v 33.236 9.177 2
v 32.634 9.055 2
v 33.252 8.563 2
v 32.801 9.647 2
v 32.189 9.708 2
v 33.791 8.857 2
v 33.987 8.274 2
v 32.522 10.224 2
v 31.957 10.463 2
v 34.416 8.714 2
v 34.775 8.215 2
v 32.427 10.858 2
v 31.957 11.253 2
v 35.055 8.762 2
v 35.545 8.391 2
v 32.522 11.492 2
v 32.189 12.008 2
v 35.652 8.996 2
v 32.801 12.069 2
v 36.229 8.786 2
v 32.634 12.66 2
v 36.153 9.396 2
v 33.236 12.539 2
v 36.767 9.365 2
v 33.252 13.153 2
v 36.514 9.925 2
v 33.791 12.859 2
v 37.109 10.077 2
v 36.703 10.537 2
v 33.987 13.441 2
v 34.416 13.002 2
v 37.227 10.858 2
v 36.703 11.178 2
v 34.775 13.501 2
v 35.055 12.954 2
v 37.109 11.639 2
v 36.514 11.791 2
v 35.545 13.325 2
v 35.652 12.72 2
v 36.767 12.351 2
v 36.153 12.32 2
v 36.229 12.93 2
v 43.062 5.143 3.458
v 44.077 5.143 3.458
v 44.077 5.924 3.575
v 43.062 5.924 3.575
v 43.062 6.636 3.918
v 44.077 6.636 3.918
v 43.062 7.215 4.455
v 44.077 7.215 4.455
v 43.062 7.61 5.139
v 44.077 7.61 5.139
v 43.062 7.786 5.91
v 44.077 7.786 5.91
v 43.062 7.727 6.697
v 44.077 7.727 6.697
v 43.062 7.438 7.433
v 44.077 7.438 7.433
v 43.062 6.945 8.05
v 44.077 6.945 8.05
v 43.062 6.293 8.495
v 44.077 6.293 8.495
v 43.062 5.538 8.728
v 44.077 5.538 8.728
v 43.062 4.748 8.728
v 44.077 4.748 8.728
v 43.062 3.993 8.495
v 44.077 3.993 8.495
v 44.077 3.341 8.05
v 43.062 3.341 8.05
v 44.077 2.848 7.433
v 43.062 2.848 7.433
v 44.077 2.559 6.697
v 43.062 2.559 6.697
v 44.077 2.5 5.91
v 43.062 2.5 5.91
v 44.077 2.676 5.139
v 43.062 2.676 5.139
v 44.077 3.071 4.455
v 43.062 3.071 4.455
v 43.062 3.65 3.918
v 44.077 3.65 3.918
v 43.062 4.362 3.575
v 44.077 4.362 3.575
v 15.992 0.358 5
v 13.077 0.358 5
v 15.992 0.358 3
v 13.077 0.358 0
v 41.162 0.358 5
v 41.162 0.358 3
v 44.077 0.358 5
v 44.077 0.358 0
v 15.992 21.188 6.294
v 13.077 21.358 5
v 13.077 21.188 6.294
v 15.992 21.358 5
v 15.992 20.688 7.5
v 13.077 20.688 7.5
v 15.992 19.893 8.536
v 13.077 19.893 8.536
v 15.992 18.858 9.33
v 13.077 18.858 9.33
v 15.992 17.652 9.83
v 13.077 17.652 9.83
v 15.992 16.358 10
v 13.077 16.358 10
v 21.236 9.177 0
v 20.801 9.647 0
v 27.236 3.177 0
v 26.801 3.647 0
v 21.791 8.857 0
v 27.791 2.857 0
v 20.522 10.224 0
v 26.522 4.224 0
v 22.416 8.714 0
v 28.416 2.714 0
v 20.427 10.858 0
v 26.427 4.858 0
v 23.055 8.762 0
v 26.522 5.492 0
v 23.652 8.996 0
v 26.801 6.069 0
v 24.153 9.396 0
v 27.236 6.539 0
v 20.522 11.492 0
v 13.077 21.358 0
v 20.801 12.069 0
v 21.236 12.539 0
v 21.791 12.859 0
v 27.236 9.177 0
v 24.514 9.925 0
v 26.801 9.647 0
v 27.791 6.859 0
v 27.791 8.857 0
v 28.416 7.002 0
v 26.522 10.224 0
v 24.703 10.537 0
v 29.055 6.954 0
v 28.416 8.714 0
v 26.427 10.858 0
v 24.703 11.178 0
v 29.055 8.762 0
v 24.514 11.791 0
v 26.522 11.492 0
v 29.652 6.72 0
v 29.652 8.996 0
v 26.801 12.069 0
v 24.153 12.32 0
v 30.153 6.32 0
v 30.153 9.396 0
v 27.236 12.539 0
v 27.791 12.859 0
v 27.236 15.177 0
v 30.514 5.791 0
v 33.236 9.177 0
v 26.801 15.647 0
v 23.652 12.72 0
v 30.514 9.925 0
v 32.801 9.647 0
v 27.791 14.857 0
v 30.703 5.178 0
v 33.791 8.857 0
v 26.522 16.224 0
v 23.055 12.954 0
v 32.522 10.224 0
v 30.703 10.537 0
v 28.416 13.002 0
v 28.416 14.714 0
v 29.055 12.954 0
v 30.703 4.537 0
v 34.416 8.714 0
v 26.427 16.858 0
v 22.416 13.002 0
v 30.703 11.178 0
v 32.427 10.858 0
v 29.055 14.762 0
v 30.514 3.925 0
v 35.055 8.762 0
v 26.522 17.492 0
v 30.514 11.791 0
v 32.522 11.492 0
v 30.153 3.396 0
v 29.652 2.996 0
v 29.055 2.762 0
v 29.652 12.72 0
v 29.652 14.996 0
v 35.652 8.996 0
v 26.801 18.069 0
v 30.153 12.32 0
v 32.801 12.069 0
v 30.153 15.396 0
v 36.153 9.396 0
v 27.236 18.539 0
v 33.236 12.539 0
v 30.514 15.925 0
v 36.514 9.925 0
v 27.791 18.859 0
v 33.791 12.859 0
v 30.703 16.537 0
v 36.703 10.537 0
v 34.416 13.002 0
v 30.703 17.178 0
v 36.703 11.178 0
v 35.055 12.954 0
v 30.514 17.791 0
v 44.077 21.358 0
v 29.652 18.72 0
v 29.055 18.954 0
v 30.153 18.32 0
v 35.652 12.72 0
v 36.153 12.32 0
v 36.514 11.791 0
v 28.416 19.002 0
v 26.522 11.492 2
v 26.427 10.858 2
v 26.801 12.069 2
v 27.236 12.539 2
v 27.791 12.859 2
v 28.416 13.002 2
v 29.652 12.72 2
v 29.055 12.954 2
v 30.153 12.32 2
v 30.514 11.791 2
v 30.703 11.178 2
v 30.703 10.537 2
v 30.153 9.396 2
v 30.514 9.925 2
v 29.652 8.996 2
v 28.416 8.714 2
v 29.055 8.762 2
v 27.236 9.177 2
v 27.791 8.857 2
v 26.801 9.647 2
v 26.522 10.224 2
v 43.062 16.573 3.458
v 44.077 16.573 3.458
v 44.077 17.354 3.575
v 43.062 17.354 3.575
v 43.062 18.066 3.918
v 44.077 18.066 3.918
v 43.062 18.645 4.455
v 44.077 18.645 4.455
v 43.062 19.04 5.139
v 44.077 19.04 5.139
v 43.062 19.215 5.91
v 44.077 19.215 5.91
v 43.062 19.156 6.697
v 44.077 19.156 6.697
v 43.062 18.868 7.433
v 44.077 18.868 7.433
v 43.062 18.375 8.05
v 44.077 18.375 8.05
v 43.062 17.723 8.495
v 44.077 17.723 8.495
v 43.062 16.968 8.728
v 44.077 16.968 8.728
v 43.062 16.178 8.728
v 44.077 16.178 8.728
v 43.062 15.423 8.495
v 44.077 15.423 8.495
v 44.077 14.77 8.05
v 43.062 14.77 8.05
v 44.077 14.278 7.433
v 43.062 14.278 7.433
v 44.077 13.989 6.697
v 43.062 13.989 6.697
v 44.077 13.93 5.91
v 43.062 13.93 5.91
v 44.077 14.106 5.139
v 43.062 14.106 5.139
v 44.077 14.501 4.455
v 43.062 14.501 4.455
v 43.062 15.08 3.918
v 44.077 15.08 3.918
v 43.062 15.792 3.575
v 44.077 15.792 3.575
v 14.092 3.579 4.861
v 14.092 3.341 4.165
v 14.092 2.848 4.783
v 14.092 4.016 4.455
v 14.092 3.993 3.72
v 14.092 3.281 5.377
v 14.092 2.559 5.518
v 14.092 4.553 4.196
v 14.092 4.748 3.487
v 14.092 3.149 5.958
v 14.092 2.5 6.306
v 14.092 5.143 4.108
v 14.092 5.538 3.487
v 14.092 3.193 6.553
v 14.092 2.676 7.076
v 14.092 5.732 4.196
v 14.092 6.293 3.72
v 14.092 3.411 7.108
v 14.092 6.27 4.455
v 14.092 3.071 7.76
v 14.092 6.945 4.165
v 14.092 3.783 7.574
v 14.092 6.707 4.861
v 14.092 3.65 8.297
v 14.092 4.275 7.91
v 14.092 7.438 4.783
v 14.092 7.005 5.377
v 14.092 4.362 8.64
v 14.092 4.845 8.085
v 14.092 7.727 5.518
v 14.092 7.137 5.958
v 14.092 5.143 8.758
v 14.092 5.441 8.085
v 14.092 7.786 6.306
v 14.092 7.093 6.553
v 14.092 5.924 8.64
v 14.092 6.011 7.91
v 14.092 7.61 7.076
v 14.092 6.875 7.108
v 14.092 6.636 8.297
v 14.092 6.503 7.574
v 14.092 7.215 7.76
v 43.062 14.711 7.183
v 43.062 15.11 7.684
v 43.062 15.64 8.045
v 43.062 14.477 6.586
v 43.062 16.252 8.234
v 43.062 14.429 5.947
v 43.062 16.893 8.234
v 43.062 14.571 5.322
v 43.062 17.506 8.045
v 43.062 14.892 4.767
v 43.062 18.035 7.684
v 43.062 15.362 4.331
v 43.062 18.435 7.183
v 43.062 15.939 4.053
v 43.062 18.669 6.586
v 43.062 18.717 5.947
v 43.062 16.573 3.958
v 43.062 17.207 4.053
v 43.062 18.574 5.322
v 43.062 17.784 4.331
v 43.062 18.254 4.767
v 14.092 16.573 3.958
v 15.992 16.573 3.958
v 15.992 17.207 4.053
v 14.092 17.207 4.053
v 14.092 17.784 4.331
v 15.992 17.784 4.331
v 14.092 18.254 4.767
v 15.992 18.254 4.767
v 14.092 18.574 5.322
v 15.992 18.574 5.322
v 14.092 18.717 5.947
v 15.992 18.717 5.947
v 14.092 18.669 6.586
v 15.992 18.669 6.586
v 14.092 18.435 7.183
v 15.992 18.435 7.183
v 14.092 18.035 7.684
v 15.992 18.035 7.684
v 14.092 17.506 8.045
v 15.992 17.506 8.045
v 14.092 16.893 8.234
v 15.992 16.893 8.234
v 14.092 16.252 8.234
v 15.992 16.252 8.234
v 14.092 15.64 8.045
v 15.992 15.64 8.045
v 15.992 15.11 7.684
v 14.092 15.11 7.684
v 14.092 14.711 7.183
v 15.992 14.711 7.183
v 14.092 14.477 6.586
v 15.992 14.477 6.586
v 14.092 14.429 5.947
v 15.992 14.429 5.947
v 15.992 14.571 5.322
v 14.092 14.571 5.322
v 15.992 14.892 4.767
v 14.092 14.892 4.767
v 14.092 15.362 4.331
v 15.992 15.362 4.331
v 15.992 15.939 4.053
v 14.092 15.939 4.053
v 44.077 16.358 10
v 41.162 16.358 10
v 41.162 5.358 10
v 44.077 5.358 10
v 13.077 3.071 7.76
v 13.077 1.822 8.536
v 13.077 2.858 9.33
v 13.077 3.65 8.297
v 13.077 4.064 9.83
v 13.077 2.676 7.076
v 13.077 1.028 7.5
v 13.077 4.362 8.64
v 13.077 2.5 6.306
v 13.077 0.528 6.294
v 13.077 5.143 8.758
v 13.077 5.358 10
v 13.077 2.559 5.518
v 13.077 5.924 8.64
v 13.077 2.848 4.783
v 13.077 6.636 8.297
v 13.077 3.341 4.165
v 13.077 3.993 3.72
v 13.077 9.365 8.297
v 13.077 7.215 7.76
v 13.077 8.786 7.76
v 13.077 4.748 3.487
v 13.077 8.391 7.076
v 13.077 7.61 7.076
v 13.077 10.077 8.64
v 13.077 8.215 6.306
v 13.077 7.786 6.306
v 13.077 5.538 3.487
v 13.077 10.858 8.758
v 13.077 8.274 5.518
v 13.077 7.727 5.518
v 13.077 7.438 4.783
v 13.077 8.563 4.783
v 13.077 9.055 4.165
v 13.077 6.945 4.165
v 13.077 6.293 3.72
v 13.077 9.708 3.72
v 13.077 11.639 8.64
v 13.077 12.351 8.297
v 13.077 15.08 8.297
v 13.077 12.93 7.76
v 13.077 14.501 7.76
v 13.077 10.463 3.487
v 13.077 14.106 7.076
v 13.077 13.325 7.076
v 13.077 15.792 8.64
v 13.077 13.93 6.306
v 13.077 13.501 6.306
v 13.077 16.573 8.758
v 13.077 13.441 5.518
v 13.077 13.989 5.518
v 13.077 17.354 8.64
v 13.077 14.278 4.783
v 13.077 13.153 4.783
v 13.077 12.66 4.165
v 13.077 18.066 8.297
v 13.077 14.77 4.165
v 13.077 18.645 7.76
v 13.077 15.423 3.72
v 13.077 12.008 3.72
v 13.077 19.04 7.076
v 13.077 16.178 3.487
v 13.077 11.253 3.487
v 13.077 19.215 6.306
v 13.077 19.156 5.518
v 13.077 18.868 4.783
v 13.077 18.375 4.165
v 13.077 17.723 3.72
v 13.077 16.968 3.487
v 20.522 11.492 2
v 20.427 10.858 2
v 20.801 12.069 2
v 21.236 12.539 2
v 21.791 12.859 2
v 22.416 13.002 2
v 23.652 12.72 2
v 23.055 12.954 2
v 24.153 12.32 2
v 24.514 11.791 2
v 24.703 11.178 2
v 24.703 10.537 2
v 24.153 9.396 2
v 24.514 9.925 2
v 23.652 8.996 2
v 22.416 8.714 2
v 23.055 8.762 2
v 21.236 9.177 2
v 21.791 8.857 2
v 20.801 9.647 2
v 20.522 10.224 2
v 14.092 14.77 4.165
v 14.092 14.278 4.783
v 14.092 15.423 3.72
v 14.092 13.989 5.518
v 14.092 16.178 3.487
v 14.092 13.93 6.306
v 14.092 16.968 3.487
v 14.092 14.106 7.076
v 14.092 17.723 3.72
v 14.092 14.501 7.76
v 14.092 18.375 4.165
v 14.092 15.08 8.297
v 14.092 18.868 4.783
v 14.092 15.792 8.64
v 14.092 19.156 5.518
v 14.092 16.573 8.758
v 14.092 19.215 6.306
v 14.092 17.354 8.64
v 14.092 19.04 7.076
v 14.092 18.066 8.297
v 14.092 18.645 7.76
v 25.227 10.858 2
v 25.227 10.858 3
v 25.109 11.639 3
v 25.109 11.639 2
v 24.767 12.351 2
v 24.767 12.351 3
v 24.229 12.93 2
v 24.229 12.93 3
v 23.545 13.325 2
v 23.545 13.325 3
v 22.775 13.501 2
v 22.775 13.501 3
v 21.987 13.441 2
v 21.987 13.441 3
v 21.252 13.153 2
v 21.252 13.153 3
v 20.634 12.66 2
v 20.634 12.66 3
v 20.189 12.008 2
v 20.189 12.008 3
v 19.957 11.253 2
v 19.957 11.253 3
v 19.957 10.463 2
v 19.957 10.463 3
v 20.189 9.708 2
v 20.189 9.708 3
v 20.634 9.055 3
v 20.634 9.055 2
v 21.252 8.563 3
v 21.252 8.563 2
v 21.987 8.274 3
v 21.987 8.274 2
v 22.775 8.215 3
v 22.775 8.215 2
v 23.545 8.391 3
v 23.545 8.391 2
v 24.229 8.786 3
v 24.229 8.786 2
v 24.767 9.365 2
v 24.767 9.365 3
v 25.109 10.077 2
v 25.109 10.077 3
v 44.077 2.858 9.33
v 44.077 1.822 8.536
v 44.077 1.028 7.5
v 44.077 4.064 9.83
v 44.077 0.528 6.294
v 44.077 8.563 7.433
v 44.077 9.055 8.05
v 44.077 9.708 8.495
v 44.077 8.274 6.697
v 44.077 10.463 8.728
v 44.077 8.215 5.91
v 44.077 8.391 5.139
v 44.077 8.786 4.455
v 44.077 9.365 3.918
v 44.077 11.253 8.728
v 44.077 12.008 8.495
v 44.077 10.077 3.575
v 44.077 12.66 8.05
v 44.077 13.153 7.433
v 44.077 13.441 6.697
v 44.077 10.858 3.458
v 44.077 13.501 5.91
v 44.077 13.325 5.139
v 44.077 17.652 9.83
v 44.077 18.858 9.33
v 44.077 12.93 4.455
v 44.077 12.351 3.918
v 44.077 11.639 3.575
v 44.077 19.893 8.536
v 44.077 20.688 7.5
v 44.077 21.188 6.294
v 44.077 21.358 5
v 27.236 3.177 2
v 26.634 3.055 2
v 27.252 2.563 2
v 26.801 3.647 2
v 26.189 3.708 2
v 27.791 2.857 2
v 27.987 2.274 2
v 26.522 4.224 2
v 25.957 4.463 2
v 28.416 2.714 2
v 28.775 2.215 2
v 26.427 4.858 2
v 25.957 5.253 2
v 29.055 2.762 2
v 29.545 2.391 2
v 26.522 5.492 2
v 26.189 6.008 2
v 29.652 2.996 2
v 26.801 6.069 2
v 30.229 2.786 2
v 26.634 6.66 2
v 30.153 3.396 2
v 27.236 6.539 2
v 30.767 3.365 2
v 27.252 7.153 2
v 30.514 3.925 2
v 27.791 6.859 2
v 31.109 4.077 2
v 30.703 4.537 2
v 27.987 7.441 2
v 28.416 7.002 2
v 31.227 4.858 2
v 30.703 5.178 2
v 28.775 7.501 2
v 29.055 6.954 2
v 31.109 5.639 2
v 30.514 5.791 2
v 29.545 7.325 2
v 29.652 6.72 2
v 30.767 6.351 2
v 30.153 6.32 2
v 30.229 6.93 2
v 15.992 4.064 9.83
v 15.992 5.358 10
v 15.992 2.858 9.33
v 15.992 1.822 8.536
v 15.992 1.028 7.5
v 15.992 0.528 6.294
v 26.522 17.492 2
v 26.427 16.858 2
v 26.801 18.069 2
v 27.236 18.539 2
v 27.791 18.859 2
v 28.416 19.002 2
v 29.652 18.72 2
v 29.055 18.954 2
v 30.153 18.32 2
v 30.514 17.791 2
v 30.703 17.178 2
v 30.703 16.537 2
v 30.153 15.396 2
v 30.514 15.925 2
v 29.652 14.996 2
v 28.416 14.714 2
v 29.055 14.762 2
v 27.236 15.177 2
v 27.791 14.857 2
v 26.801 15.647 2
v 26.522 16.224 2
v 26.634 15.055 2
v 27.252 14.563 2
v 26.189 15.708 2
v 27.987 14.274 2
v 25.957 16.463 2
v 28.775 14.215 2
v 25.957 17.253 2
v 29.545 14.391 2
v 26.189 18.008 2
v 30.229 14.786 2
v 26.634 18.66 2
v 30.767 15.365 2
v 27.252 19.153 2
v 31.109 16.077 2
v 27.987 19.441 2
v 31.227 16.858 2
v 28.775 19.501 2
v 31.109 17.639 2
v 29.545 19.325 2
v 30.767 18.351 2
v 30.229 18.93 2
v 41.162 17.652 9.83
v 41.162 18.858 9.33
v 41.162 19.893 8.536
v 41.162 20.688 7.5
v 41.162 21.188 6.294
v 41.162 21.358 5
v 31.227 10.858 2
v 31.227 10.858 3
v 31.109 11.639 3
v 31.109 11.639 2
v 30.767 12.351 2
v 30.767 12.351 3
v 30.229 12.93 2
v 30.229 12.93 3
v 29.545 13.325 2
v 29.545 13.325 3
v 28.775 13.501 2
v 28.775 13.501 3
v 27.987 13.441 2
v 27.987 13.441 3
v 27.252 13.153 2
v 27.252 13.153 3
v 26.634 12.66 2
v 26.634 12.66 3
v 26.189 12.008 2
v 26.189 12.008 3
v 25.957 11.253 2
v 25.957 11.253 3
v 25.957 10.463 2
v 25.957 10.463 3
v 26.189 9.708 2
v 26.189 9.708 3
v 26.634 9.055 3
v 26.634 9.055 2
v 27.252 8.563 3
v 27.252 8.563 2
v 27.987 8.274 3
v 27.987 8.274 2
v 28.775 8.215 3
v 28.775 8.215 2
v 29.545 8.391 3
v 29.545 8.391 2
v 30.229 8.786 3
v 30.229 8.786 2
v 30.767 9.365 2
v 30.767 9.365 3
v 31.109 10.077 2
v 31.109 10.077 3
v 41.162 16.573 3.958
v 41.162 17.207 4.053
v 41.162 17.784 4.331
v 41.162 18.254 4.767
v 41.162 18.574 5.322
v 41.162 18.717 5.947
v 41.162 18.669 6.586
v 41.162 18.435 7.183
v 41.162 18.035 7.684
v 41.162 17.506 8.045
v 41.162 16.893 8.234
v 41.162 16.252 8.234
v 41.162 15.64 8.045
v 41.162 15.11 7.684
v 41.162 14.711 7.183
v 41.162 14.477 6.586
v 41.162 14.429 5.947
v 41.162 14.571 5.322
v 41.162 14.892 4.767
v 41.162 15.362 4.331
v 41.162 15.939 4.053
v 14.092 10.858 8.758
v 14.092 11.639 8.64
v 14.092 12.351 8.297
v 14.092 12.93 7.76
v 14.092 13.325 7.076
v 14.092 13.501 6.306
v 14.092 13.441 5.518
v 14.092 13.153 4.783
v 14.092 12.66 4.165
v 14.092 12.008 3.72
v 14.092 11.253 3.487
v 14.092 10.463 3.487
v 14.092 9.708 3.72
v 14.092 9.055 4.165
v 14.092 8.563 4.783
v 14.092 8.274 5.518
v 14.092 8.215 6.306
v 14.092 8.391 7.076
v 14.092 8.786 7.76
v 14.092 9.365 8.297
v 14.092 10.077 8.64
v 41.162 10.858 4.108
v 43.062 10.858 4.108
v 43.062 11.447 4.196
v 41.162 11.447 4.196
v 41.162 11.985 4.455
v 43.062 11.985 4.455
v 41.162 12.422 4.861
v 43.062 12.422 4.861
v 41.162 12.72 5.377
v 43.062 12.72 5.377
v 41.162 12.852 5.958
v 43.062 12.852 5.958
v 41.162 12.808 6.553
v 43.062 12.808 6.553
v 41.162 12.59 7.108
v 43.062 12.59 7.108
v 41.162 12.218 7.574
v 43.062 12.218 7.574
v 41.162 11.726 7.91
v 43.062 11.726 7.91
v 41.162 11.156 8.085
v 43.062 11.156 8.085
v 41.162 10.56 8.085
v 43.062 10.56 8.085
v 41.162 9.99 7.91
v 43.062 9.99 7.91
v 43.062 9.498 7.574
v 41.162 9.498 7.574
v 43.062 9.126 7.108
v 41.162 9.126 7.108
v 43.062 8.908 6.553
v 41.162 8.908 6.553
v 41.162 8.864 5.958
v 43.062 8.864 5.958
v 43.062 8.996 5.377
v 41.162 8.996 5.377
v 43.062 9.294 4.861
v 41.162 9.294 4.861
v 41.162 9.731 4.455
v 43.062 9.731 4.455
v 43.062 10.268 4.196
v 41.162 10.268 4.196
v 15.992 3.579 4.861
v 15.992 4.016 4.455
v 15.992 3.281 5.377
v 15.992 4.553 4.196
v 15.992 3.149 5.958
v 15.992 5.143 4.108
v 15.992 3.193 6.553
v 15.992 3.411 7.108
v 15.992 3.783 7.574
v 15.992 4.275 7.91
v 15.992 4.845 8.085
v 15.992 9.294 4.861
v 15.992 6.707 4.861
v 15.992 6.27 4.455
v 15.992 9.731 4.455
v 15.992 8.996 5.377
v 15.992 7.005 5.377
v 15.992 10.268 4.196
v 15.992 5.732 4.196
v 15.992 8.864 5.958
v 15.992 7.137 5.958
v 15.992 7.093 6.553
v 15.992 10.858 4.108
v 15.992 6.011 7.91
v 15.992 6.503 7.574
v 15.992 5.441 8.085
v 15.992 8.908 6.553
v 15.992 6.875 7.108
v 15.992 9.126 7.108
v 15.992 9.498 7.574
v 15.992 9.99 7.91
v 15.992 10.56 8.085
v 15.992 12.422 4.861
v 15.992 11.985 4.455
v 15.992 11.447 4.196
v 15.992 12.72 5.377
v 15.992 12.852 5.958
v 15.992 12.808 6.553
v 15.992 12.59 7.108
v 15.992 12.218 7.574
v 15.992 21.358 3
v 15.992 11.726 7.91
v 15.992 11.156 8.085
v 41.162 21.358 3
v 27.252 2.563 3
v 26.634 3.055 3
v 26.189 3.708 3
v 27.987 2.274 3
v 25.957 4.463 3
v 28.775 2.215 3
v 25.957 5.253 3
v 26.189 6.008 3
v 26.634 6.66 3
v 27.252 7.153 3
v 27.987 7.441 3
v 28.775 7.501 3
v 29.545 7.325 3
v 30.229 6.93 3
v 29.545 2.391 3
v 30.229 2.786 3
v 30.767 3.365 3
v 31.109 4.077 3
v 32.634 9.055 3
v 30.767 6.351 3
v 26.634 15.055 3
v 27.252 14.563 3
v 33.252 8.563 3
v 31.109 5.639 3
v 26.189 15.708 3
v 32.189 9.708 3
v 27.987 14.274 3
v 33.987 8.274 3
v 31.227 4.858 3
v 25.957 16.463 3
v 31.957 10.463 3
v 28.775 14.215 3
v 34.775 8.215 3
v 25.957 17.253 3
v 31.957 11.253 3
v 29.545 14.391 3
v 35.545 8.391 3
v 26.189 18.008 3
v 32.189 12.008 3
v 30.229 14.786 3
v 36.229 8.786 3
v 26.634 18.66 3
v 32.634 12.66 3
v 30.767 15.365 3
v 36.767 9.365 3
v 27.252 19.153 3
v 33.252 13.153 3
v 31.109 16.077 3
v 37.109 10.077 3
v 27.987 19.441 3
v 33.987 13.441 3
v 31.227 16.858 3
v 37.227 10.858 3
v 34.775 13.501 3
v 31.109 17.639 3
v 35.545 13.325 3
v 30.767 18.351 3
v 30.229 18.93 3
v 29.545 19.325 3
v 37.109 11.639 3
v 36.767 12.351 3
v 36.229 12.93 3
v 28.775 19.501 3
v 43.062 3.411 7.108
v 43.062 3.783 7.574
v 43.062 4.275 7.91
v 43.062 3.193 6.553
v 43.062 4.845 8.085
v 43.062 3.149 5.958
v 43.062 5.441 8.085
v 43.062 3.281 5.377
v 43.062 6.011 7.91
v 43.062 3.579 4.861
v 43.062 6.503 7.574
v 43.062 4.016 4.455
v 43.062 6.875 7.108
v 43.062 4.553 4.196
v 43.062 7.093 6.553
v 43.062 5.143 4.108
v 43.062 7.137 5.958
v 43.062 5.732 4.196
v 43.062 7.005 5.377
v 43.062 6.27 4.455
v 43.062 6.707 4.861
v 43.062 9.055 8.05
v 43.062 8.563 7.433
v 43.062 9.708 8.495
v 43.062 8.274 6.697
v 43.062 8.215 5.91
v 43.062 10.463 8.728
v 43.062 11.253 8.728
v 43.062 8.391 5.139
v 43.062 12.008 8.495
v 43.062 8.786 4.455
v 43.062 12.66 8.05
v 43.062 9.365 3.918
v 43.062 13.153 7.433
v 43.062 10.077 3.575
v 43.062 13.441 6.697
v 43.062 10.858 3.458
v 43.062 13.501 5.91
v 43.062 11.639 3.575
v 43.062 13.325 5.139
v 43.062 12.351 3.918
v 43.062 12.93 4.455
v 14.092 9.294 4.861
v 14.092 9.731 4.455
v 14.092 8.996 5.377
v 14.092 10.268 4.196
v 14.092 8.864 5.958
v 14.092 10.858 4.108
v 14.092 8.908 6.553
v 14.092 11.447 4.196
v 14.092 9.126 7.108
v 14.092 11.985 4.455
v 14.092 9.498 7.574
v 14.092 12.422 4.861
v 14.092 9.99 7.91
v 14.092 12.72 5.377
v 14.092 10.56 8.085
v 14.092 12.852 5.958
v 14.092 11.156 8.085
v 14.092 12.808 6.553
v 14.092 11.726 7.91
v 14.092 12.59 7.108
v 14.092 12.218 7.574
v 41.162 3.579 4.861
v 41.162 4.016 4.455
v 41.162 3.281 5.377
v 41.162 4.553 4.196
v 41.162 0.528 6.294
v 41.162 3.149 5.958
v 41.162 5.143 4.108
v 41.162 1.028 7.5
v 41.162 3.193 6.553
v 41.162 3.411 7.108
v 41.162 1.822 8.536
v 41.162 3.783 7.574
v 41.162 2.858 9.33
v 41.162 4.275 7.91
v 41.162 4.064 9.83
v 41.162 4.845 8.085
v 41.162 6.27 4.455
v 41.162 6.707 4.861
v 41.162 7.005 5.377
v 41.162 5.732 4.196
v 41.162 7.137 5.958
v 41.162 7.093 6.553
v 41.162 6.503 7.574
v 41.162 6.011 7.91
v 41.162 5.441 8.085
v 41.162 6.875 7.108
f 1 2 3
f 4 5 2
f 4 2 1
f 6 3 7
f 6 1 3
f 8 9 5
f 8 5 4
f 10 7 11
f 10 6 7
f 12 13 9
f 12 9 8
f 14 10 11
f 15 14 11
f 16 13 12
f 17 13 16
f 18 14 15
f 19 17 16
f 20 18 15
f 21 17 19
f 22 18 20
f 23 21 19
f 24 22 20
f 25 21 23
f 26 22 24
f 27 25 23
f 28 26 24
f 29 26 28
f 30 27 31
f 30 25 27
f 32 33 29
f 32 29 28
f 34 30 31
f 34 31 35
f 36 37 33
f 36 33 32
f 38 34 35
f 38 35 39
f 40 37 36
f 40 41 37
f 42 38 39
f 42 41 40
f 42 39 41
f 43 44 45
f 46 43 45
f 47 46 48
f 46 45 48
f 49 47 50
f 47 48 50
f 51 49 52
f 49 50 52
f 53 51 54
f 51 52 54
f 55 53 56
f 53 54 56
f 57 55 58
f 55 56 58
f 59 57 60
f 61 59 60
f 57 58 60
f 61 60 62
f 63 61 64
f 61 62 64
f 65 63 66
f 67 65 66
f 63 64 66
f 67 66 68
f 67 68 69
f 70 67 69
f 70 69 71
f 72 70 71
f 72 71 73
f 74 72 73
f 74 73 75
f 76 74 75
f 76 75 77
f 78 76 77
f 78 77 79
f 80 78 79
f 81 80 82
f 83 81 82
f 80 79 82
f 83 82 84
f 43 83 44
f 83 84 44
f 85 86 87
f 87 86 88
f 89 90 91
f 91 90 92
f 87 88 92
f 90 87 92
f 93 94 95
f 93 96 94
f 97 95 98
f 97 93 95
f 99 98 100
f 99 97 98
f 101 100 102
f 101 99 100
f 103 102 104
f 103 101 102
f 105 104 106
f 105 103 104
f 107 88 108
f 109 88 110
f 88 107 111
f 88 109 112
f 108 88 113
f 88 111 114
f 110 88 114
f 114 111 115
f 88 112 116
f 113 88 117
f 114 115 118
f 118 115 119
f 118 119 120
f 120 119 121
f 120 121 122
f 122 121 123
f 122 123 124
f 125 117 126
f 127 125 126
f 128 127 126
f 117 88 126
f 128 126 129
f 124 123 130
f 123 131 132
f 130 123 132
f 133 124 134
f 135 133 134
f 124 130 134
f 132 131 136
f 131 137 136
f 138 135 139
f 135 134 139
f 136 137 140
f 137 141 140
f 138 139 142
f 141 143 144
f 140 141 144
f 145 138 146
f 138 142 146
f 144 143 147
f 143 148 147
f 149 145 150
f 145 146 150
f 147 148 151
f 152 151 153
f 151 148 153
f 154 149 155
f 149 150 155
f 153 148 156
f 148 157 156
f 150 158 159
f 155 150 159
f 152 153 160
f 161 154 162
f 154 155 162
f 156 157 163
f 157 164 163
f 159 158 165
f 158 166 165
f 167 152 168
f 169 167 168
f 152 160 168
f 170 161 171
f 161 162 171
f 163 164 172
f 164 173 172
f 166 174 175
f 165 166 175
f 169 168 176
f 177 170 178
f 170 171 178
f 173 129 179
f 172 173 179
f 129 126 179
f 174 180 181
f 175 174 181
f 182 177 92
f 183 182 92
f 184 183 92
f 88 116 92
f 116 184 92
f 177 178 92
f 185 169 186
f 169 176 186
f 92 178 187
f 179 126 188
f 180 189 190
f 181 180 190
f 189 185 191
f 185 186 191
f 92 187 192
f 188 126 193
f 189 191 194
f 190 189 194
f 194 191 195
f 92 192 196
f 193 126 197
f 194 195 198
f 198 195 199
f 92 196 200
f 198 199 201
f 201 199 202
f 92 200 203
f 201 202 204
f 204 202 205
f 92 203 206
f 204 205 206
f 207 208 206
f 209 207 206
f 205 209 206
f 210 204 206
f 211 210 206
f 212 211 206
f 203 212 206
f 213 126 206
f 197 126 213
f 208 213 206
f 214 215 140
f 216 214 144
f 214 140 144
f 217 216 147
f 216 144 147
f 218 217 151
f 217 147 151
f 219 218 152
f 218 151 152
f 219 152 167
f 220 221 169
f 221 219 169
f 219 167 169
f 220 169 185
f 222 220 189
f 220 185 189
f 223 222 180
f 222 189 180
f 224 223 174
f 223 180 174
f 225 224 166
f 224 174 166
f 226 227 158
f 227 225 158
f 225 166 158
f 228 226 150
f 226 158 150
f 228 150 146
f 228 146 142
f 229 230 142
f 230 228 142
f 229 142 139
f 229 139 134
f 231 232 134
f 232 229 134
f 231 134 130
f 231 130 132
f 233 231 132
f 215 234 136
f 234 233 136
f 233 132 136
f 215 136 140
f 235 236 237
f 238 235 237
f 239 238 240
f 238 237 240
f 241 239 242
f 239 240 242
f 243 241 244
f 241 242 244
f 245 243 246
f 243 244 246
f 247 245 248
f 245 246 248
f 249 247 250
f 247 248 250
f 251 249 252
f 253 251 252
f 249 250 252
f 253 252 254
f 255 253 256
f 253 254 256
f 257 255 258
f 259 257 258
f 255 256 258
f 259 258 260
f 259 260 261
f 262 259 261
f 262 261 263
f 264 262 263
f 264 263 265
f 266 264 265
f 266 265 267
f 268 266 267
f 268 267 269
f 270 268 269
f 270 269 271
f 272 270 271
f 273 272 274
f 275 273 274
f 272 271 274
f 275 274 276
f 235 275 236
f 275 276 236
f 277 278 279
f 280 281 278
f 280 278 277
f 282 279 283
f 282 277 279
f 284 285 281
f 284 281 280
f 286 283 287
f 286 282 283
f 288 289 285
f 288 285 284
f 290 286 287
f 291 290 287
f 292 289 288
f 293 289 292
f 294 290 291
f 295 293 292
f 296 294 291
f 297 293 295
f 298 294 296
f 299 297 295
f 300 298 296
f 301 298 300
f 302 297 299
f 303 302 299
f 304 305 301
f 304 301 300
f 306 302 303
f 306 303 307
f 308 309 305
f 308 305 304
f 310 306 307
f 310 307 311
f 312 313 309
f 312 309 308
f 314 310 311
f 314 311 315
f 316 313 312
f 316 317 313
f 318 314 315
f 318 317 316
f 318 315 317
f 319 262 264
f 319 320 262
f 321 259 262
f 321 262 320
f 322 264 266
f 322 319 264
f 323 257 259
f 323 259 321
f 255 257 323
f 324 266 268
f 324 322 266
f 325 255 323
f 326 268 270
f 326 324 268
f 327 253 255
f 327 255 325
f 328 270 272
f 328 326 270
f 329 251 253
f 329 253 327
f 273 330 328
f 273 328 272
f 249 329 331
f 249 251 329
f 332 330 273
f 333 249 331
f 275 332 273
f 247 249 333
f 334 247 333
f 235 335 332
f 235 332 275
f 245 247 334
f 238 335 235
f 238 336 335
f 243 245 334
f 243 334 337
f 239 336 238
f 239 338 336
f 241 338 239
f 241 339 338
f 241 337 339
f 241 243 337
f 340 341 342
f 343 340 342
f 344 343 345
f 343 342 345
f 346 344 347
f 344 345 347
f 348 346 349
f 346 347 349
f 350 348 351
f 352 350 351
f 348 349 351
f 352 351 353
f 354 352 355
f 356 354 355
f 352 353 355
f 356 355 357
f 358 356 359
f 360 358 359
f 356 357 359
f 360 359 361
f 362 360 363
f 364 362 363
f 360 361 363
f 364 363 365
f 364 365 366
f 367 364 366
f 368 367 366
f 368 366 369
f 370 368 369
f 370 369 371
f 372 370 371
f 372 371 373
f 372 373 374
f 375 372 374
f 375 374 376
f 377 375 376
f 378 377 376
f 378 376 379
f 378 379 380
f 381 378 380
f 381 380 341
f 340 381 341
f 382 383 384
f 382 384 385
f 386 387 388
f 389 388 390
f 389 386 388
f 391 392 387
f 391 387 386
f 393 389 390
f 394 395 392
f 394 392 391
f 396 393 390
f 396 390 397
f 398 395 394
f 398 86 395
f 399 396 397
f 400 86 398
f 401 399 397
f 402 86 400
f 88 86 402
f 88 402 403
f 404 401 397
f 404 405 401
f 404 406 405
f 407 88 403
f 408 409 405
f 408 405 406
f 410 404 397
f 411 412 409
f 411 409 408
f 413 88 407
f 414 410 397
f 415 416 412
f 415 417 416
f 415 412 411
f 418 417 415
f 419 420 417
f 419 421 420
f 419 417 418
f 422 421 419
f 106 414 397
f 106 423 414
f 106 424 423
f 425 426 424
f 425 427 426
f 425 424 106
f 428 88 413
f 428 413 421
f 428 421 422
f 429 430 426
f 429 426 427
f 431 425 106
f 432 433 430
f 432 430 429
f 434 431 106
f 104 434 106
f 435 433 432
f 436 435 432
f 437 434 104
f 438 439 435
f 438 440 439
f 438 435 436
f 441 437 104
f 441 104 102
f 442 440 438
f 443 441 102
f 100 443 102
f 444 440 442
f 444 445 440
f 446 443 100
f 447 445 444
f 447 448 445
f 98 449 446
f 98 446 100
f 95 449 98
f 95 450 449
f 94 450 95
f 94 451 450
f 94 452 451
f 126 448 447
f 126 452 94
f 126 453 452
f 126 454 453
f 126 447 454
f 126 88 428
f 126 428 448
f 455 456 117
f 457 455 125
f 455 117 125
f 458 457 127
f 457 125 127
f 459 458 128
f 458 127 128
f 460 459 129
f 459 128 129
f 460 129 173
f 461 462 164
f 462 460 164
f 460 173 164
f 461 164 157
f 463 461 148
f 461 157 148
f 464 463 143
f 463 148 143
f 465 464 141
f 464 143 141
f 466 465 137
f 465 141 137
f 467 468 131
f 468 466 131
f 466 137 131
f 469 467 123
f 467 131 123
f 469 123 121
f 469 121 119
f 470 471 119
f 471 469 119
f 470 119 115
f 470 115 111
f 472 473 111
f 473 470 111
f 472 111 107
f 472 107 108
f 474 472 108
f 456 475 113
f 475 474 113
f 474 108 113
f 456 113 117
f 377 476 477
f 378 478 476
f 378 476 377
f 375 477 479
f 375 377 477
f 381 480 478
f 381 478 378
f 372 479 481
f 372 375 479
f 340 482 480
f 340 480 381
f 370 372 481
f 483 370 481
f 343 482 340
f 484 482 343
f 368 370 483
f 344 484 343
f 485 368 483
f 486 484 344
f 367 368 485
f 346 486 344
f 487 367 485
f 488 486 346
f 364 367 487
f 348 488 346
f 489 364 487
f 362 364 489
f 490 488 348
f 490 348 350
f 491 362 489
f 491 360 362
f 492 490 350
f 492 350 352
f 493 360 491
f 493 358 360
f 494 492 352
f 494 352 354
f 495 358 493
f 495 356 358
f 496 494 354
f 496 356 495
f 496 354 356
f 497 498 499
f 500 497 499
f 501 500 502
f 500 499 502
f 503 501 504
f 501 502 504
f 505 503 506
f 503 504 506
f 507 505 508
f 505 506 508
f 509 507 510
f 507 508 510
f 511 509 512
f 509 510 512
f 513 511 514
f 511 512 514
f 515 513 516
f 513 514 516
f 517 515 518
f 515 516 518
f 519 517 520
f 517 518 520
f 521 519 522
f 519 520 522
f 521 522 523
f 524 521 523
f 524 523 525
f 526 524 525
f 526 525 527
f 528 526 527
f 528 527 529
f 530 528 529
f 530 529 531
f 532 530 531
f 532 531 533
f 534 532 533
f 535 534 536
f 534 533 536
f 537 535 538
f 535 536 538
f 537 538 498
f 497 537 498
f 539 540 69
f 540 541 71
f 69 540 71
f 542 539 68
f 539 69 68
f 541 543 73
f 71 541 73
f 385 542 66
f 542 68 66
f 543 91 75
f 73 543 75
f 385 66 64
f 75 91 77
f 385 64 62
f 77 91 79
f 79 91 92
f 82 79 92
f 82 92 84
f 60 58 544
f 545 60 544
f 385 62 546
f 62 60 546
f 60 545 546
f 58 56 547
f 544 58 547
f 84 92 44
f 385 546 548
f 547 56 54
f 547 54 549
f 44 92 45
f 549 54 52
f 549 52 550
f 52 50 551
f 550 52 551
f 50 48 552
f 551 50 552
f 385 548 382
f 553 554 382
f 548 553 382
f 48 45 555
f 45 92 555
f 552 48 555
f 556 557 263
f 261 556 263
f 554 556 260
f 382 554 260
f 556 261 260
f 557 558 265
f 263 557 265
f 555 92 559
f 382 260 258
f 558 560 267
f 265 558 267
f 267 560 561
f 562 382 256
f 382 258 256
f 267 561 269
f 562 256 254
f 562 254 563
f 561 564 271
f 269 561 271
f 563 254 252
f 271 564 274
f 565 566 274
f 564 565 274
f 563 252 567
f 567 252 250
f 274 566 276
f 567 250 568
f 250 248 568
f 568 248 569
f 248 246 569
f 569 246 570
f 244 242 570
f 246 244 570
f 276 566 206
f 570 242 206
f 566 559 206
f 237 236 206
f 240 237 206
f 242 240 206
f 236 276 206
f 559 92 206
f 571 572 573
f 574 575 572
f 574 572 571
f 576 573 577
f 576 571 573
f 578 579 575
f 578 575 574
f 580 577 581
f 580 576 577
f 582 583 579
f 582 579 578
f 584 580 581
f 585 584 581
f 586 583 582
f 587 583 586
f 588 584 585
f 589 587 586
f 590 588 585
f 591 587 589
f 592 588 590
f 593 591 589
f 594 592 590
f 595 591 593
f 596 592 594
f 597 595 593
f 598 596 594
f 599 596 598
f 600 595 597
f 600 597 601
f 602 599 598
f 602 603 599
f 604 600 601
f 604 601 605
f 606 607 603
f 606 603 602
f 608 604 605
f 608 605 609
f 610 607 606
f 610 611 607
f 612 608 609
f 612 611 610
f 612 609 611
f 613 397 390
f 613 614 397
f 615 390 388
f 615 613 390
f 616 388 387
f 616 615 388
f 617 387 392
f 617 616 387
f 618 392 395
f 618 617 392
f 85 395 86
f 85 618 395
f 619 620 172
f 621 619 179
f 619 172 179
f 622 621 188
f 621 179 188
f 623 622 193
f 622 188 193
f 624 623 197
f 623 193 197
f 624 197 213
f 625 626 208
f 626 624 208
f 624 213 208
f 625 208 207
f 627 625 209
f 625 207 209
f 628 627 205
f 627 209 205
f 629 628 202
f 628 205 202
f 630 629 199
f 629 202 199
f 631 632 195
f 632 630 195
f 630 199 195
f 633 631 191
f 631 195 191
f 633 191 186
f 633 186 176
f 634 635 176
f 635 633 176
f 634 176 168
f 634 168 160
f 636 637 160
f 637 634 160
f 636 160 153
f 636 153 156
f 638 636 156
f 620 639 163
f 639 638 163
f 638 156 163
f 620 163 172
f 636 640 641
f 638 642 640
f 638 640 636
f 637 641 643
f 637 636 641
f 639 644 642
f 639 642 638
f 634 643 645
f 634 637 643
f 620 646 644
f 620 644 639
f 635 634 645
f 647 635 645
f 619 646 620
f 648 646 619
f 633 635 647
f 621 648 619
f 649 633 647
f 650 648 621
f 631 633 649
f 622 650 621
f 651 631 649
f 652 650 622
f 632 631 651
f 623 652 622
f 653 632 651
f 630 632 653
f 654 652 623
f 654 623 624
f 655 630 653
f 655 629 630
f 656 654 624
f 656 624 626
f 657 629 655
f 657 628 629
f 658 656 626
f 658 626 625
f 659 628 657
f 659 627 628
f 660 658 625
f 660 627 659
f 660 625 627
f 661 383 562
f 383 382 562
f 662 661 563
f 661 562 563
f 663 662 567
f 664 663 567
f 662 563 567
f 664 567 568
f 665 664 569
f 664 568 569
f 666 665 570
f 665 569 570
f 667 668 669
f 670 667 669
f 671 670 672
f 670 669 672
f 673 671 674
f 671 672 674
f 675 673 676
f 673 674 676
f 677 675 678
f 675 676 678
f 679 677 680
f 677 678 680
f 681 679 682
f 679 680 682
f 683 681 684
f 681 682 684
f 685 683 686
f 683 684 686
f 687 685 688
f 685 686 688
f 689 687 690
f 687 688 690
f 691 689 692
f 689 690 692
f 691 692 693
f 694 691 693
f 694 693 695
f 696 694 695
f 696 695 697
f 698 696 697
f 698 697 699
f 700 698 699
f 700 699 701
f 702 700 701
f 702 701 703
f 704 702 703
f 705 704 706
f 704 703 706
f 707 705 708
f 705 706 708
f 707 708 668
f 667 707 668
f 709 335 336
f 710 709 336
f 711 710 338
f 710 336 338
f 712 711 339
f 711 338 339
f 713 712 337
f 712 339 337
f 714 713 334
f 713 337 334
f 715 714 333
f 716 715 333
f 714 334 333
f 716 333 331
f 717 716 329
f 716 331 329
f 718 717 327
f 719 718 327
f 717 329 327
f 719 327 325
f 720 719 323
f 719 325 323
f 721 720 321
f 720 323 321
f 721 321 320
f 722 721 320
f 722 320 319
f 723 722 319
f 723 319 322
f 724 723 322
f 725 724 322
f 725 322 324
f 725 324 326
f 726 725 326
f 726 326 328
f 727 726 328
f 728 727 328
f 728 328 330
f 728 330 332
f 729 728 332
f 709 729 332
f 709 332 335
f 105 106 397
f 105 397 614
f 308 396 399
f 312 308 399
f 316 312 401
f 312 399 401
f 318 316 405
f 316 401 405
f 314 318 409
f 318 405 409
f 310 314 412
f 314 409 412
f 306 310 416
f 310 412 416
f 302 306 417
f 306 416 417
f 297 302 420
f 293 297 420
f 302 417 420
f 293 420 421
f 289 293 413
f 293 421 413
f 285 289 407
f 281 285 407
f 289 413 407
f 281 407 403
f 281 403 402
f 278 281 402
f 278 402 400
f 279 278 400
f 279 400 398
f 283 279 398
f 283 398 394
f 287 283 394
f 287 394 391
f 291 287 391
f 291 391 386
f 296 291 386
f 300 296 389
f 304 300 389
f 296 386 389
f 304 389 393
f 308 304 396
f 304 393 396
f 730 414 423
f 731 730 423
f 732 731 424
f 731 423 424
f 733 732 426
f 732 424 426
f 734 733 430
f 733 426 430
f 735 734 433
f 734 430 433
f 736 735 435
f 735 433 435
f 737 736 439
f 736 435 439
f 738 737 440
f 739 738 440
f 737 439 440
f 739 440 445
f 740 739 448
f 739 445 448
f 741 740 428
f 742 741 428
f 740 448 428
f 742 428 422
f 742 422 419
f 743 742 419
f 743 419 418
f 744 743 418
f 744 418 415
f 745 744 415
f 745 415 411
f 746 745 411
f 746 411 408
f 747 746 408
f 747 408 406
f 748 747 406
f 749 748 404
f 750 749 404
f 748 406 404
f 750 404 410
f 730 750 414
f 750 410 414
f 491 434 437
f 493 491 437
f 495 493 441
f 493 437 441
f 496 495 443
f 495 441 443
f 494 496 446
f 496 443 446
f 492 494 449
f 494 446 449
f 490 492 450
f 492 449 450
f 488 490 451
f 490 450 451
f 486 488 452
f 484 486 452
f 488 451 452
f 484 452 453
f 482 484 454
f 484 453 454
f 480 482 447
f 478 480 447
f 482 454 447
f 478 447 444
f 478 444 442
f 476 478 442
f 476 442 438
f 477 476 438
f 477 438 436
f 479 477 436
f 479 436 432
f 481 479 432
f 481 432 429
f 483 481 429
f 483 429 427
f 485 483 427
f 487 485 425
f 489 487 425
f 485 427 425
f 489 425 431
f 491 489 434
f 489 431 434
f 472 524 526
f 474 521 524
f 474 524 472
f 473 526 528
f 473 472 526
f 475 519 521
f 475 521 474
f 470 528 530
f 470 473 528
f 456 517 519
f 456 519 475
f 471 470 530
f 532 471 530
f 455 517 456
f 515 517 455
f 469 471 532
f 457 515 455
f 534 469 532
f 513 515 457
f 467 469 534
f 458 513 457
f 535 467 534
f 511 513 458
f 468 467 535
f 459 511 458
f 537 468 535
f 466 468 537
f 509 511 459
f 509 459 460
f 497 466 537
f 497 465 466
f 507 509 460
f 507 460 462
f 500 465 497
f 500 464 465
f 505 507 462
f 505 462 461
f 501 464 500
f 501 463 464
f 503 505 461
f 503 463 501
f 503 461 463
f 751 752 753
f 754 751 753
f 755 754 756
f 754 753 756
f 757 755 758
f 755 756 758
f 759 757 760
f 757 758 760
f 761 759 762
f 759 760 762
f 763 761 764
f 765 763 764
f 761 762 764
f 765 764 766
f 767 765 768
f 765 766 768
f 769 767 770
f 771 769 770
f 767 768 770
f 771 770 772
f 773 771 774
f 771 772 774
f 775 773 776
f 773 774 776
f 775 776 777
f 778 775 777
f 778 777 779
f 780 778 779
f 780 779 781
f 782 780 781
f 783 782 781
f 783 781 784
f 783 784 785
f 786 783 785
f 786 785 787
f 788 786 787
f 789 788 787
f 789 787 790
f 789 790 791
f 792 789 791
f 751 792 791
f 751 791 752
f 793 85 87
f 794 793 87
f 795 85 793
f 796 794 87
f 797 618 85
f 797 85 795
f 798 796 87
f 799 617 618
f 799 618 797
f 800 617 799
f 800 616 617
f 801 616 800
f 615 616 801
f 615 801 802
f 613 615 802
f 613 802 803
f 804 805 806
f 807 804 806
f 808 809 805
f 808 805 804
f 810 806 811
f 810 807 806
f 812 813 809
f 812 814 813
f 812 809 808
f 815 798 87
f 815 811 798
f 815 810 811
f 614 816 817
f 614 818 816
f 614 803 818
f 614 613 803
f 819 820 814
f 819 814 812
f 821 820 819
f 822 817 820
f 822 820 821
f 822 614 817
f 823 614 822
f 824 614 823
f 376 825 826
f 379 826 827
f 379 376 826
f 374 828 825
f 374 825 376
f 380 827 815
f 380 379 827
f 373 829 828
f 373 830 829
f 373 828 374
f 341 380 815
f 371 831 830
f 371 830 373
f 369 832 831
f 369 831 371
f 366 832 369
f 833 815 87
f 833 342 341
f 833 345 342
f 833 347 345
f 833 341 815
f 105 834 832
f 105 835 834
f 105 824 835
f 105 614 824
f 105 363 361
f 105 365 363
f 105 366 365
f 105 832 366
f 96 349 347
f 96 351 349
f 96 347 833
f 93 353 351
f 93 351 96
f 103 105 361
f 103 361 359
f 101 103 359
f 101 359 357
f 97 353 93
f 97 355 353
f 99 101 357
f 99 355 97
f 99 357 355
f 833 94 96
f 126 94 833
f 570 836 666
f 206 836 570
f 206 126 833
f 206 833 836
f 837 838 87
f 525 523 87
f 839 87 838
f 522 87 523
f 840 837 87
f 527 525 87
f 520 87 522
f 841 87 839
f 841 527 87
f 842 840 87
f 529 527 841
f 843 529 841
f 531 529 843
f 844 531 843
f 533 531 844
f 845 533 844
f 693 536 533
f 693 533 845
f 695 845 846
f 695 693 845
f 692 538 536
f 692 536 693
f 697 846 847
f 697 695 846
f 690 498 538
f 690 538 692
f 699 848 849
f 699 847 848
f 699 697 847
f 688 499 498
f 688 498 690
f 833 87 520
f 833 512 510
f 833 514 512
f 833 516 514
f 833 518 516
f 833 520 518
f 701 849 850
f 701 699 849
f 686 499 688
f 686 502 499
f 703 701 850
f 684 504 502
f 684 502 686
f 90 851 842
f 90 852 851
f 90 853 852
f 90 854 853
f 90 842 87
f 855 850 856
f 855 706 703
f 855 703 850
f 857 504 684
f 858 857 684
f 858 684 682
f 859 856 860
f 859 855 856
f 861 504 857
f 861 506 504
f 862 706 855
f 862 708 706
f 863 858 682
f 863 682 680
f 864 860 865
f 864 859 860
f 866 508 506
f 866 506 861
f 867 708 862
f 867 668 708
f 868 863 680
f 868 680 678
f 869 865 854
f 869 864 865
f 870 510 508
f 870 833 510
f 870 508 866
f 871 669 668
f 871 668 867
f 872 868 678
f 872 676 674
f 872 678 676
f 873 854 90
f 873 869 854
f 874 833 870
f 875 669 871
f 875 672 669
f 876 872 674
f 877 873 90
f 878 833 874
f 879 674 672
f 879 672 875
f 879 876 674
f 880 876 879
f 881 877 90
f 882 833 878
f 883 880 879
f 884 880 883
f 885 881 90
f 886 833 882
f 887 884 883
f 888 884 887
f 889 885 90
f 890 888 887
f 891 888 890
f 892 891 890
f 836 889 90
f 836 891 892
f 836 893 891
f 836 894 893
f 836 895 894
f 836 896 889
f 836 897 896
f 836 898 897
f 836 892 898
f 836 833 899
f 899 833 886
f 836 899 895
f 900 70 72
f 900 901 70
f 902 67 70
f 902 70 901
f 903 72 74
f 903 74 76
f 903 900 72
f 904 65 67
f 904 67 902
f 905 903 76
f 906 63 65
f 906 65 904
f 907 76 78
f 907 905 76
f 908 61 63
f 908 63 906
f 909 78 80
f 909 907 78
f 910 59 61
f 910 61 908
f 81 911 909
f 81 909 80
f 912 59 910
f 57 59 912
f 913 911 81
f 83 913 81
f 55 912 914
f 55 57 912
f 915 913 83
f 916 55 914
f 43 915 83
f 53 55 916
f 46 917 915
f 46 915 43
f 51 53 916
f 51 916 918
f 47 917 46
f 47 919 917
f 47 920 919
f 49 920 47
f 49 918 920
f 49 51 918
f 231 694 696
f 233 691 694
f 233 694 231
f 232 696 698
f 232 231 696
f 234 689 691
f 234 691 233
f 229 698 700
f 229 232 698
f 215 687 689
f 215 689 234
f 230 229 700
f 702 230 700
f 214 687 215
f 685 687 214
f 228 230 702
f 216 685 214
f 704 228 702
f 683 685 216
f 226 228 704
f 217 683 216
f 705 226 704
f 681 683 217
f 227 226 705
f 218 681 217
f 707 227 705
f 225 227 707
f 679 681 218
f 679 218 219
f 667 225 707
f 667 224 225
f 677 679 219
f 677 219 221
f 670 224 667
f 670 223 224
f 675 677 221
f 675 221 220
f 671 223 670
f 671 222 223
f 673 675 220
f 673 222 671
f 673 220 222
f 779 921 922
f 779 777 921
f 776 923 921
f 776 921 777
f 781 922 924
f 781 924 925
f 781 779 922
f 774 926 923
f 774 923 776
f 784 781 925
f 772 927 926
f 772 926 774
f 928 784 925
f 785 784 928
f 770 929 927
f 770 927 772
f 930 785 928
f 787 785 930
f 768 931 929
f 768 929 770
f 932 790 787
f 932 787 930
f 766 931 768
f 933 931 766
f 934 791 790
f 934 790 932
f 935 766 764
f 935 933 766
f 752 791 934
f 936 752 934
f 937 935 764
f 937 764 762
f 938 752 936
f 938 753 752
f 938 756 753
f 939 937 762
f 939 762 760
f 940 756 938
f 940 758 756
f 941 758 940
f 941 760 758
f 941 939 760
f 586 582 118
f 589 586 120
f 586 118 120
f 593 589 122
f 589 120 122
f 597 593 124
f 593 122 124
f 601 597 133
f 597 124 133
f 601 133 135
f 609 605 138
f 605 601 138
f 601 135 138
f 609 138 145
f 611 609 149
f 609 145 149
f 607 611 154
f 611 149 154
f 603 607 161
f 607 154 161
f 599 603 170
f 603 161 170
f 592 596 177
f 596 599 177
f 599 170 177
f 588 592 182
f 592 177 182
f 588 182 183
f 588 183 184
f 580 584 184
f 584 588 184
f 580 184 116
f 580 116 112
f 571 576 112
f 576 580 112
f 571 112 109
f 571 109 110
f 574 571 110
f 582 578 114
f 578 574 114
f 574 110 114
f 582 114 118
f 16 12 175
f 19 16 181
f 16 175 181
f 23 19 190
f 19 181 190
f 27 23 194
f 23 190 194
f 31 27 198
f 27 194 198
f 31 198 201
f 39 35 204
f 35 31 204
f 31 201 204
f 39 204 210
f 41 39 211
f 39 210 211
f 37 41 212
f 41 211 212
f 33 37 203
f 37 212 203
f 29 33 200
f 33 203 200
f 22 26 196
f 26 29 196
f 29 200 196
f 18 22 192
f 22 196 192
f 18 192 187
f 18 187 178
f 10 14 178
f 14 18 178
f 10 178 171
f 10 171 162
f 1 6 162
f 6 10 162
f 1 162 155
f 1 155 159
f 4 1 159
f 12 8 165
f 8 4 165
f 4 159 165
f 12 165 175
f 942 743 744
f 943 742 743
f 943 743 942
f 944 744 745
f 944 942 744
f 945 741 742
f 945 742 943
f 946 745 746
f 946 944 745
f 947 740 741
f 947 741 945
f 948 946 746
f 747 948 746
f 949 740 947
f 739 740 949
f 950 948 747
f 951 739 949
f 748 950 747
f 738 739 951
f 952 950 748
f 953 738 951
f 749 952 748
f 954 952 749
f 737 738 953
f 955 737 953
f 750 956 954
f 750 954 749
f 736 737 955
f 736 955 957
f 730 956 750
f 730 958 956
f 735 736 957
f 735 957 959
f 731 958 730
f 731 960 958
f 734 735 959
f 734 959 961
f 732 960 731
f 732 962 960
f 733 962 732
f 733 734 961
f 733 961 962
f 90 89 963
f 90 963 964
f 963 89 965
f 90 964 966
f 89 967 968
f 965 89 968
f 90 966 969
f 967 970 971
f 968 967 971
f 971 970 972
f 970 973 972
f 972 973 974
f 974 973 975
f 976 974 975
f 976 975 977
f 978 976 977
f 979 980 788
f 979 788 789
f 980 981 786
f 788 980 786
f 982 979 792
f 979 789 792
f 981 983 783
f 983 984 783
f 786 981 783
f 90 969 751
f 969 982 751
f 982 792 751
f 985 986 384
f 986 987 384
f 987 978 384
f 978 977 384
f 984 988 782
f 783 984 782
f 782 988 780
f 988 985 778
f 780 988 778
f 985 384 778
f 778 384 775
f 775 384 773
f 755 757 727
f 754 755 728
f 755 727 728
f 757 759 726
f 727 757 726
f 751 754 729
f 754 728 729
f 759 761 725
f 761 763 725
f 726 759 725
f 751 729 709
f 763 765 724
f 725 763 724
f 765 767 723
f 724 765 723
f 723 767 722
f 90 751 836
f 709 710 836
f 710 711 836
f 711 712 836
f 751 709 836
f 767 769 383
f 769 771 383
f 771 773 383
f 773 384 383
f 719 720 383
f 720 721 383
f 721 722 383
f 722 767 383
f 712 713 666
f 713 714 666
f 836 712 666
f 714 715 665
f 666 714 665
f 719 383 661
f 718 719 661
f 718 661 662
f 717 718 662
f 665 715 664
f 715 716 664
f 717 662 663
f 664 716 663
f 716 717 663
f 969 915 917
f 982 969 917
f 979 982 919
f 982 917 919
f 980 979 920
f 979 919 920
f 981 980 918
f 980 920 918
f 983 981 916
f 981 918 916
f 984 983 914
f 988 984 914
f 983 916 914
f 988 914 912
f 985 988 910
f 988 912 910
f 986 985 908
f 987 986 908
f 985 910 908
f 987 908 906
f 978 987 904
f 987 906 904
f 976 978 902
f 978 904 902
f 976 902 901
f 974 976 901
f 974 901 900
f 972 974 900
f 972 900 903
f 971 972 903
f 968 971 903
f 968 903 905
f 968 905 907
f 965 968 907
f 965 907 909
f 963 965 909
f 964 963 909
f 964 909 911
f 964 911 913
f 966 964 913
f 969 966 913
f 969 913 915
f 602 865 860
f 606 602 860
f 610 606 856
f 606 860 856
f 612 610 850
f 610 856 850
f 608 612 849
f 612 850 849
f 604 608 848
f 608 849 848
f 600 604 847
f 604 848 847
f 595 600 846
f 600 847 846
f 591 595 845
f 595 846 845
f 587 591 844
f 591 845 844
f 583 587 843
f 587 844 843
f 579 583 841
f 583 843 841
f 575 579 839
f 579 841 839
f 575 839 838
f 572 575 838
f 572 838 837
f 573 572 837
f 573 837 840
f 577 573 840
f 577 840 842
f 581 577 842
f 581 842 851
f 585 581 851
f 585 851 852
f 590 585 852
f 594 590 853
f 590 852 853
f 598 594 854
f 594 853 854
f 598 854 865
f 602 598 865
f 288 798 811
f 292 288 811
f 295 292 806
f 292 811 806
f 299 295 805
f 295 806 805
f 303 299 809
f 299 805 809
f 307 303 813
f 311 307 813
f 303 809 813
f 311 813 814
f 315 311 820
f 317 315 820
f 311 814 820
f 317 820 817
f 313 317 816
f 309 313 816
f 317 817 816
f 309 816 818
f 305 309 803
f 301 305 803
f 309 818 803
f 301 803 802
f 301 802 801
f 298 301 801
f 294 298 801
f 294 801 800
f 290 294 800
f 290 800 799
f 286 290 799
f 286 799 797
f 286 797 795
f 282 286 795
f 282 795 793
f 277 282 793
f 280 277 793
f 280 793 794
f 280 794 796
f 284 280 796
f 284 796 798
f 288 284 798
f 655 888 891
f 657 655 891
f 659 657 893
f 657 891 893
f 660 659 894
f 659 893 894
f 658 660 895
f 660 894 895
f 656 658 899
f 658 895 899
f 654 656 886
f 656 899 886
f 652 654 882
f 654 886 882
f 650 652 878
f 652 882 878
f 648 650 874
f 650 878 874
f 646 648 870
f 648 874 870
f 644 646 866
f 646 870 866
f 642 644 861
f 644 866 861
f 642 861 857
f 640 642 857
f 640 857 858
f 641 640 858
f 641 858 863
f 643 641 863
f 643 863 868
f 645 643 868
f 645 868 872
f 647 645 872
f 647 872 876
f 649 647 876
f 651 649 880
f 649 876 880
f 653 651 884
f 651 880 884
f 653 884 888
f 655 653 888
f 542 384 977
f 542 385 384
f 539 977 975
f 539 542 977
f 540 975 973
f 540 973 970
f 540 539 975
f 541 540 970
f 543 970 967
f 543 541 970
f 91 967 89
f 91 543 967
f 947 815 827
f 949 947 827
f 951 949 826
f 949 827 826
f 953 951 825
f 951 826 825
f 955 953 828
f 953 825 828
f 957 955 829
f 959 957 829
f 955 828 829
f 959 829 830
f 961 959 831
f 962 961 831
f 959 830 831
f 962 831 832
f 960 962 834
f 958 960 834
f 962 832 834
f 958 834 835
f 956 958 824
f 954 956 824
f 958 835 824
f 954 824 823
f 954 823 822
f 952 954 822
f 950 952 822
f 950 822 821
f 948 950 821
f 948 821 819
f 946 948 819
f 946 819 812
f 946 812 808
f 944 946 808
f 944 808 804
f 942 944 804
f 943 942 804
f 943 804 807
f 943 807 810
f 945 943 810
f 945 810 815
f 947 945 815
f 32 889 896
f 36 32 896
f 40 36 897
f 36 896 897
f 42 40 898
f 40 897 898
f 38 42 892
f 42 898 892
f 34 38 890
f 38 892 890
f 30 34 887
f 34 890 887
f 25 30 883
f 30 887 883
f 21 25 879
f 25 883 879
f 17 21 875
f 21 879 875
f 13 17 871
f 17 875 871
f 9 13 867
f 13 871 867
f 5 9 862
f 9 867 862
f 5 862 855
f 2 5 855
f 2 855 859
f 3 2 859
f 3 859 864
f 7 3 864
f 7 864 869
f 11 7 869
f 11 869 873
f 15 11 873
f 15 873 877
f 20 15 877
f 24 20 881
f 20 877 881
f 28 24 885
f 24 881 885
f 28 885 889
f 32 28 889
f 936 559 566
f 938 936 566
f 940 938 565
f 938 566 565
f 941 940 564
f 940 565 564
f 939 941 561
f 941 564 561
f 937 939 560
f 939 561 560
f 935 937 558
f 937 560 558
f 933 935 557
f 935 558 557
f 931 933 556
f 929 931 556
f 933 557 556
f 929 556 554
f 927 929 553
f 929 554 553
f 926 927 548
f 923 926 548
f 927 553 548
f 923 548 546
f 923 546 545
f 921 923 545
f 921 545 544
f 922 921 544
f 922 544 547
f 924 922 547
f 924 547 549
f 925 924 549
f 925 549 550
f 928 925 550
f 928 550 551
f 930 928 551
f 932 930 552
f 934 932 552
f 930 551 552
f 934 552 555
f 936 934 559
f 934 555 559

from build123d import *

# Parameters (mm, degrees)
CROQUIS1_W              = 31
CROQUIS1_H              = 21
SALIENTE_EXTRUIR1_DEPTH = 10
CROQUIS2_W              = 25.17
CROQUIS2_H              = 21
CORTAR_EXTRUIR1_DEPTH   = 7
CROQUIS5_R              = 2.15
CORTAR_EXTRUIR2_DEPTH   = 50.989400856
CROQUIS6_R              = 2
CROQUIS6_R_2            = 2.15
CORTAR_EXTRUIR4_DEPTH   = 39.950744164
CROQUIS6_3_R            = 2.65
CROQUIS6_3_R_2          = 2
CROQUIS6_3_R_3          = 2.15
CORTAR_EXTRUIR5_DEPTH   = 1.015
CORTAR_EXTRUIR6_START   = -1.015
CROQUIS9_R              = 2.65
CROQUIS9_R_2            = 2.15
CROQUIS9_R_3            = 2
CORTAR_EXTRUIR6_DEPTH   = 1.015
REDONDEO5_R             = 5
CORTAR_EXTRUIR8_START   = -1
CROQUIS10_R             = 2.65
CROQUIS10_R_2           = 2.15
CORTAR_EXTRUIR8_DEPTH   = 1


with BuildPart() as part:
    # Croquis1 → Saliente-Extruir1 (new body)
    with BuildSketch(Plane.XY):
        with Locations((28.576975021, 10.857913544)):
            Rectangle(CROQUIS1_W, CROQUIS1_H)
    extrude(amount=SALIENTE_EXTRUIR1_DEPTH)

    # Croquis2 → Cortar-Extruir1 (cut)
    with BuildSketch(Plane.XY.offset(10)):
        with Locations((28.576975021, 10.857913544)):
            Rectangle(CROQUIS2_W, CROQUIS2_H)
    extrude(amount=-CORTAR_EXTRUIR1_DEPTH, mode=Mode.SUBTRACT)

    # Croquis5 → Cortar-Extruir2 (cut, through all)
    with BuildSketch(Plane(origin=(0, 0, 0), x_dir=(-1, 0, 0), z_dir=(0, 0, -1))):
        with Locations((-28.576975021, 16.857913544)):
            Circle(CROQUIS5_R)
        with Locations((-22.576975021, 10.857913544)):
            Circle(CROQUIS5_R)
        with Locations((-34.576975021, 10.857913544)):
            Circle(CROQUIS5_R)
        with Locations((-28.576975021, 4.857913544)):
            Circle(CROQUIS5_R)
        with Locations((-28.576975021, 10.857913544)):
            Circle(CROQUIS5_R)
    extrude(amount=-CORTAR_EXTRUIR2_DEPTH, mode=Mode.SUBTRACT)

    # Croquis6 → Cortar-Extruir4 (cut, through all)
    with BuildSketch(Plane(origin=(44.076975021, 0, 0), x_dir=(0, 0, -1), z_dir=(1, 0, 0))):
        with Locations((-6.107568768, 5.142964849)):
            Circle(CROQUIS6_R)
        with Locations((-6.107568768, 10.857913544)):
            Circle(CROQUIS6_R)
        with Locations((-6.107568768, 16.572862239)):
            Circle(CROQUIS6_R_2)
    extrude(amount=-CORTAR_EXTRUIR4_DEPTH, mode=Mode.SUBTRACT)

    # Croquis6<3> → Cortar-Extruir5 (cut)
    # profile 1 of 3: a face of its own
    with BuildSketch(Plane(origin=(44.076975021, 0, 0), x_dir=(0, 0, -1), z_dir=(1, 0, 0))):
        with Locations((-6.107568768, 5.142964849)):
            Circle(CROQUIS6_3_R)
        with Locations((-6.107568768, 5.142964849)):
            Circle(CROQUIS6_3_R_2, mode=Mode.SUBTRACT)
    # profile 2 of 3: a face of its own
    with BuildSketch(Plane(origin=(44.076975021, 0, 0), x_dir=(0, 0, -1), z_dir=(1, 0, 0))):
        with Locations((-6.107568768, 10.857913544)):
            Circle(CROQUIS6_3_R)
        with Locations((-6.107568768, 10.857913544)):
            Circle(CROQUIS6_3_R_2, mode=Mode.SUBTRACT)
    # profile 3 of 3: a face of its own
    with BuildSketch(Plane(origin=(44.076975021, 0, 0), x_dir=(0, 0, -1), z_dir=(1, 0, 0))):
        with Locations((-6.107568768, 16.572862239)):
            Circle(CROQUIS6_3_R)
        with Locations((-6.107568768, 16.572862239)):
            Circle(CROQUIS6_3_R_3, mode=Mode.SUBTRACT)
    extrude(amount=-CORTAR_EXTRUIR5_DEPTH, mode=Mode.SUBTRACT)

    # Croquis9 → Cortar-Extruir6 (cut)
    # profile 1 of 3: a face of its own
    with BuildSketch(Plane.ZY.offset(-13.076975021).offset(CORTAR_EXTRUIR6_START)):
        with Locations((6.107568768, 16.572862239)):
            Circle(CROQUIS9_R)
        with Locations((6.107568768, 16.572862239)):
            Circle(CROQUIS9_R_2, mode=Mode.SUBTRACT)
    # profile 2 of 3: a face of its own
    with BuildSketch(Plane.ZY.offset(-13.076975021).offset(CORTAR_EXTRUIR6_START)):
        with Locations((6.107568768, 10.857913544)):
            Circle(CROQUIS9_R)
        with Locations((6.107568768, 10.857913544)):
            Circle(CROQUIS9_R_3, mode=Mode.SUBTRACT)
    # profile 3 of 3: a face of its own
    with BuildSketch(Plane.ZY.offset(-13.076975021).offset(CORTAR_EXTRUIR6_START)):
        with Locations((6.107568768, 5.142964849)):
            Circle(CROQUIS9_R)
        with Locations((6.107568768, 5.142964849)):
            Circle(CROQUIS9_R_3, mode=Mode.SUBTRACT)
    extrude(amount=CORTAR_EXTRUIR6_DEPTH, mode=Mode.SUBTRACT)

    # Redondeo5
    redondeo5_edges = [part.edges().sort_by_distance(p)[0] for p in [
        (14.534475021, 0.357913544, 10),
        (42.619475021, 0.357913544, 10),
        (42.619475021, 21.357913544, 10),
        (14.534475021, 21.357913544, 10),
    ]]
    fillet(redondeo5_edges, radius=REDONDEO5_R)

    # Croquis10 → Cortar-Extruir8 (cut)
    # profile 1 of 5: a face of its own
    with BuildSketch(Plane.XY.offset(3).offset(CORTAR_EXTRUIR8_START)):
        with Locations((28.576975021, 16.857913544)):
            Circle(CROQUIS10_R)
        with Locations((28.576975021, 16.857913544)):
            Circle(CROQUIS10_R_2, mode=Mode.SUBTRACT)
    # profile 2 of 5: a face of its own
    with BuildSketch(Plane.XY.offset(3).offset(CORTAR_EXTRUIR8_START)):
        with Locations((34.576975021, 10.857913544)):
            Circle(CROQUIS10_R)
        with Locations((34.576975021, 10.857913544)):
            Circle(CROQUIS10_R_2, mode=Mode.SUBTRACT)
    # profile 3 of 5: a face of its own
    with BuildSketch(Plane.XY.offset(3).offset(CORTAR_EXTRUIR8_START)):
        with Locations((28.576975021, 10.857913544)):
            Circle(CROQUIS10_R)
        with Locations((28.576975021, 10.857913544)):
            Circle(CROQUIS10_R_2, mode=Mode.SUBTRACT)
    # profile 4 of 5: a face of its own
    with BuildSketch(Plane.XY.offset(3).offset(CORTAR_EXTRUIR8_START)):
        with Locations((22.576975021, 10.857913544)):
            Circle(CROQUIS10_R)
        with Locations((22.576975021, 10.857913544)):
            Circle(CROQUIS10_R_2, mode=Mode.SUBTRACT)
    # profile 5 of 5: a face of its own
    with BuildSketch(Plane.XY.offset(3).offset(CORTAR_EXTRUIR8_START)):
        with Locations((28.576975021, 4.857913544)):
            Circle(CROQUIS10_R)
        with Locations((28.576975021, 4.857913544)):
            Circle(CROQUIS10_R_2, mode=Mode.SUBTRACT)
    extrude(amount=CORTAR_EXTRUIR8_DEPTH, mode=Mode.SUBTRACT)


solid = part.part
